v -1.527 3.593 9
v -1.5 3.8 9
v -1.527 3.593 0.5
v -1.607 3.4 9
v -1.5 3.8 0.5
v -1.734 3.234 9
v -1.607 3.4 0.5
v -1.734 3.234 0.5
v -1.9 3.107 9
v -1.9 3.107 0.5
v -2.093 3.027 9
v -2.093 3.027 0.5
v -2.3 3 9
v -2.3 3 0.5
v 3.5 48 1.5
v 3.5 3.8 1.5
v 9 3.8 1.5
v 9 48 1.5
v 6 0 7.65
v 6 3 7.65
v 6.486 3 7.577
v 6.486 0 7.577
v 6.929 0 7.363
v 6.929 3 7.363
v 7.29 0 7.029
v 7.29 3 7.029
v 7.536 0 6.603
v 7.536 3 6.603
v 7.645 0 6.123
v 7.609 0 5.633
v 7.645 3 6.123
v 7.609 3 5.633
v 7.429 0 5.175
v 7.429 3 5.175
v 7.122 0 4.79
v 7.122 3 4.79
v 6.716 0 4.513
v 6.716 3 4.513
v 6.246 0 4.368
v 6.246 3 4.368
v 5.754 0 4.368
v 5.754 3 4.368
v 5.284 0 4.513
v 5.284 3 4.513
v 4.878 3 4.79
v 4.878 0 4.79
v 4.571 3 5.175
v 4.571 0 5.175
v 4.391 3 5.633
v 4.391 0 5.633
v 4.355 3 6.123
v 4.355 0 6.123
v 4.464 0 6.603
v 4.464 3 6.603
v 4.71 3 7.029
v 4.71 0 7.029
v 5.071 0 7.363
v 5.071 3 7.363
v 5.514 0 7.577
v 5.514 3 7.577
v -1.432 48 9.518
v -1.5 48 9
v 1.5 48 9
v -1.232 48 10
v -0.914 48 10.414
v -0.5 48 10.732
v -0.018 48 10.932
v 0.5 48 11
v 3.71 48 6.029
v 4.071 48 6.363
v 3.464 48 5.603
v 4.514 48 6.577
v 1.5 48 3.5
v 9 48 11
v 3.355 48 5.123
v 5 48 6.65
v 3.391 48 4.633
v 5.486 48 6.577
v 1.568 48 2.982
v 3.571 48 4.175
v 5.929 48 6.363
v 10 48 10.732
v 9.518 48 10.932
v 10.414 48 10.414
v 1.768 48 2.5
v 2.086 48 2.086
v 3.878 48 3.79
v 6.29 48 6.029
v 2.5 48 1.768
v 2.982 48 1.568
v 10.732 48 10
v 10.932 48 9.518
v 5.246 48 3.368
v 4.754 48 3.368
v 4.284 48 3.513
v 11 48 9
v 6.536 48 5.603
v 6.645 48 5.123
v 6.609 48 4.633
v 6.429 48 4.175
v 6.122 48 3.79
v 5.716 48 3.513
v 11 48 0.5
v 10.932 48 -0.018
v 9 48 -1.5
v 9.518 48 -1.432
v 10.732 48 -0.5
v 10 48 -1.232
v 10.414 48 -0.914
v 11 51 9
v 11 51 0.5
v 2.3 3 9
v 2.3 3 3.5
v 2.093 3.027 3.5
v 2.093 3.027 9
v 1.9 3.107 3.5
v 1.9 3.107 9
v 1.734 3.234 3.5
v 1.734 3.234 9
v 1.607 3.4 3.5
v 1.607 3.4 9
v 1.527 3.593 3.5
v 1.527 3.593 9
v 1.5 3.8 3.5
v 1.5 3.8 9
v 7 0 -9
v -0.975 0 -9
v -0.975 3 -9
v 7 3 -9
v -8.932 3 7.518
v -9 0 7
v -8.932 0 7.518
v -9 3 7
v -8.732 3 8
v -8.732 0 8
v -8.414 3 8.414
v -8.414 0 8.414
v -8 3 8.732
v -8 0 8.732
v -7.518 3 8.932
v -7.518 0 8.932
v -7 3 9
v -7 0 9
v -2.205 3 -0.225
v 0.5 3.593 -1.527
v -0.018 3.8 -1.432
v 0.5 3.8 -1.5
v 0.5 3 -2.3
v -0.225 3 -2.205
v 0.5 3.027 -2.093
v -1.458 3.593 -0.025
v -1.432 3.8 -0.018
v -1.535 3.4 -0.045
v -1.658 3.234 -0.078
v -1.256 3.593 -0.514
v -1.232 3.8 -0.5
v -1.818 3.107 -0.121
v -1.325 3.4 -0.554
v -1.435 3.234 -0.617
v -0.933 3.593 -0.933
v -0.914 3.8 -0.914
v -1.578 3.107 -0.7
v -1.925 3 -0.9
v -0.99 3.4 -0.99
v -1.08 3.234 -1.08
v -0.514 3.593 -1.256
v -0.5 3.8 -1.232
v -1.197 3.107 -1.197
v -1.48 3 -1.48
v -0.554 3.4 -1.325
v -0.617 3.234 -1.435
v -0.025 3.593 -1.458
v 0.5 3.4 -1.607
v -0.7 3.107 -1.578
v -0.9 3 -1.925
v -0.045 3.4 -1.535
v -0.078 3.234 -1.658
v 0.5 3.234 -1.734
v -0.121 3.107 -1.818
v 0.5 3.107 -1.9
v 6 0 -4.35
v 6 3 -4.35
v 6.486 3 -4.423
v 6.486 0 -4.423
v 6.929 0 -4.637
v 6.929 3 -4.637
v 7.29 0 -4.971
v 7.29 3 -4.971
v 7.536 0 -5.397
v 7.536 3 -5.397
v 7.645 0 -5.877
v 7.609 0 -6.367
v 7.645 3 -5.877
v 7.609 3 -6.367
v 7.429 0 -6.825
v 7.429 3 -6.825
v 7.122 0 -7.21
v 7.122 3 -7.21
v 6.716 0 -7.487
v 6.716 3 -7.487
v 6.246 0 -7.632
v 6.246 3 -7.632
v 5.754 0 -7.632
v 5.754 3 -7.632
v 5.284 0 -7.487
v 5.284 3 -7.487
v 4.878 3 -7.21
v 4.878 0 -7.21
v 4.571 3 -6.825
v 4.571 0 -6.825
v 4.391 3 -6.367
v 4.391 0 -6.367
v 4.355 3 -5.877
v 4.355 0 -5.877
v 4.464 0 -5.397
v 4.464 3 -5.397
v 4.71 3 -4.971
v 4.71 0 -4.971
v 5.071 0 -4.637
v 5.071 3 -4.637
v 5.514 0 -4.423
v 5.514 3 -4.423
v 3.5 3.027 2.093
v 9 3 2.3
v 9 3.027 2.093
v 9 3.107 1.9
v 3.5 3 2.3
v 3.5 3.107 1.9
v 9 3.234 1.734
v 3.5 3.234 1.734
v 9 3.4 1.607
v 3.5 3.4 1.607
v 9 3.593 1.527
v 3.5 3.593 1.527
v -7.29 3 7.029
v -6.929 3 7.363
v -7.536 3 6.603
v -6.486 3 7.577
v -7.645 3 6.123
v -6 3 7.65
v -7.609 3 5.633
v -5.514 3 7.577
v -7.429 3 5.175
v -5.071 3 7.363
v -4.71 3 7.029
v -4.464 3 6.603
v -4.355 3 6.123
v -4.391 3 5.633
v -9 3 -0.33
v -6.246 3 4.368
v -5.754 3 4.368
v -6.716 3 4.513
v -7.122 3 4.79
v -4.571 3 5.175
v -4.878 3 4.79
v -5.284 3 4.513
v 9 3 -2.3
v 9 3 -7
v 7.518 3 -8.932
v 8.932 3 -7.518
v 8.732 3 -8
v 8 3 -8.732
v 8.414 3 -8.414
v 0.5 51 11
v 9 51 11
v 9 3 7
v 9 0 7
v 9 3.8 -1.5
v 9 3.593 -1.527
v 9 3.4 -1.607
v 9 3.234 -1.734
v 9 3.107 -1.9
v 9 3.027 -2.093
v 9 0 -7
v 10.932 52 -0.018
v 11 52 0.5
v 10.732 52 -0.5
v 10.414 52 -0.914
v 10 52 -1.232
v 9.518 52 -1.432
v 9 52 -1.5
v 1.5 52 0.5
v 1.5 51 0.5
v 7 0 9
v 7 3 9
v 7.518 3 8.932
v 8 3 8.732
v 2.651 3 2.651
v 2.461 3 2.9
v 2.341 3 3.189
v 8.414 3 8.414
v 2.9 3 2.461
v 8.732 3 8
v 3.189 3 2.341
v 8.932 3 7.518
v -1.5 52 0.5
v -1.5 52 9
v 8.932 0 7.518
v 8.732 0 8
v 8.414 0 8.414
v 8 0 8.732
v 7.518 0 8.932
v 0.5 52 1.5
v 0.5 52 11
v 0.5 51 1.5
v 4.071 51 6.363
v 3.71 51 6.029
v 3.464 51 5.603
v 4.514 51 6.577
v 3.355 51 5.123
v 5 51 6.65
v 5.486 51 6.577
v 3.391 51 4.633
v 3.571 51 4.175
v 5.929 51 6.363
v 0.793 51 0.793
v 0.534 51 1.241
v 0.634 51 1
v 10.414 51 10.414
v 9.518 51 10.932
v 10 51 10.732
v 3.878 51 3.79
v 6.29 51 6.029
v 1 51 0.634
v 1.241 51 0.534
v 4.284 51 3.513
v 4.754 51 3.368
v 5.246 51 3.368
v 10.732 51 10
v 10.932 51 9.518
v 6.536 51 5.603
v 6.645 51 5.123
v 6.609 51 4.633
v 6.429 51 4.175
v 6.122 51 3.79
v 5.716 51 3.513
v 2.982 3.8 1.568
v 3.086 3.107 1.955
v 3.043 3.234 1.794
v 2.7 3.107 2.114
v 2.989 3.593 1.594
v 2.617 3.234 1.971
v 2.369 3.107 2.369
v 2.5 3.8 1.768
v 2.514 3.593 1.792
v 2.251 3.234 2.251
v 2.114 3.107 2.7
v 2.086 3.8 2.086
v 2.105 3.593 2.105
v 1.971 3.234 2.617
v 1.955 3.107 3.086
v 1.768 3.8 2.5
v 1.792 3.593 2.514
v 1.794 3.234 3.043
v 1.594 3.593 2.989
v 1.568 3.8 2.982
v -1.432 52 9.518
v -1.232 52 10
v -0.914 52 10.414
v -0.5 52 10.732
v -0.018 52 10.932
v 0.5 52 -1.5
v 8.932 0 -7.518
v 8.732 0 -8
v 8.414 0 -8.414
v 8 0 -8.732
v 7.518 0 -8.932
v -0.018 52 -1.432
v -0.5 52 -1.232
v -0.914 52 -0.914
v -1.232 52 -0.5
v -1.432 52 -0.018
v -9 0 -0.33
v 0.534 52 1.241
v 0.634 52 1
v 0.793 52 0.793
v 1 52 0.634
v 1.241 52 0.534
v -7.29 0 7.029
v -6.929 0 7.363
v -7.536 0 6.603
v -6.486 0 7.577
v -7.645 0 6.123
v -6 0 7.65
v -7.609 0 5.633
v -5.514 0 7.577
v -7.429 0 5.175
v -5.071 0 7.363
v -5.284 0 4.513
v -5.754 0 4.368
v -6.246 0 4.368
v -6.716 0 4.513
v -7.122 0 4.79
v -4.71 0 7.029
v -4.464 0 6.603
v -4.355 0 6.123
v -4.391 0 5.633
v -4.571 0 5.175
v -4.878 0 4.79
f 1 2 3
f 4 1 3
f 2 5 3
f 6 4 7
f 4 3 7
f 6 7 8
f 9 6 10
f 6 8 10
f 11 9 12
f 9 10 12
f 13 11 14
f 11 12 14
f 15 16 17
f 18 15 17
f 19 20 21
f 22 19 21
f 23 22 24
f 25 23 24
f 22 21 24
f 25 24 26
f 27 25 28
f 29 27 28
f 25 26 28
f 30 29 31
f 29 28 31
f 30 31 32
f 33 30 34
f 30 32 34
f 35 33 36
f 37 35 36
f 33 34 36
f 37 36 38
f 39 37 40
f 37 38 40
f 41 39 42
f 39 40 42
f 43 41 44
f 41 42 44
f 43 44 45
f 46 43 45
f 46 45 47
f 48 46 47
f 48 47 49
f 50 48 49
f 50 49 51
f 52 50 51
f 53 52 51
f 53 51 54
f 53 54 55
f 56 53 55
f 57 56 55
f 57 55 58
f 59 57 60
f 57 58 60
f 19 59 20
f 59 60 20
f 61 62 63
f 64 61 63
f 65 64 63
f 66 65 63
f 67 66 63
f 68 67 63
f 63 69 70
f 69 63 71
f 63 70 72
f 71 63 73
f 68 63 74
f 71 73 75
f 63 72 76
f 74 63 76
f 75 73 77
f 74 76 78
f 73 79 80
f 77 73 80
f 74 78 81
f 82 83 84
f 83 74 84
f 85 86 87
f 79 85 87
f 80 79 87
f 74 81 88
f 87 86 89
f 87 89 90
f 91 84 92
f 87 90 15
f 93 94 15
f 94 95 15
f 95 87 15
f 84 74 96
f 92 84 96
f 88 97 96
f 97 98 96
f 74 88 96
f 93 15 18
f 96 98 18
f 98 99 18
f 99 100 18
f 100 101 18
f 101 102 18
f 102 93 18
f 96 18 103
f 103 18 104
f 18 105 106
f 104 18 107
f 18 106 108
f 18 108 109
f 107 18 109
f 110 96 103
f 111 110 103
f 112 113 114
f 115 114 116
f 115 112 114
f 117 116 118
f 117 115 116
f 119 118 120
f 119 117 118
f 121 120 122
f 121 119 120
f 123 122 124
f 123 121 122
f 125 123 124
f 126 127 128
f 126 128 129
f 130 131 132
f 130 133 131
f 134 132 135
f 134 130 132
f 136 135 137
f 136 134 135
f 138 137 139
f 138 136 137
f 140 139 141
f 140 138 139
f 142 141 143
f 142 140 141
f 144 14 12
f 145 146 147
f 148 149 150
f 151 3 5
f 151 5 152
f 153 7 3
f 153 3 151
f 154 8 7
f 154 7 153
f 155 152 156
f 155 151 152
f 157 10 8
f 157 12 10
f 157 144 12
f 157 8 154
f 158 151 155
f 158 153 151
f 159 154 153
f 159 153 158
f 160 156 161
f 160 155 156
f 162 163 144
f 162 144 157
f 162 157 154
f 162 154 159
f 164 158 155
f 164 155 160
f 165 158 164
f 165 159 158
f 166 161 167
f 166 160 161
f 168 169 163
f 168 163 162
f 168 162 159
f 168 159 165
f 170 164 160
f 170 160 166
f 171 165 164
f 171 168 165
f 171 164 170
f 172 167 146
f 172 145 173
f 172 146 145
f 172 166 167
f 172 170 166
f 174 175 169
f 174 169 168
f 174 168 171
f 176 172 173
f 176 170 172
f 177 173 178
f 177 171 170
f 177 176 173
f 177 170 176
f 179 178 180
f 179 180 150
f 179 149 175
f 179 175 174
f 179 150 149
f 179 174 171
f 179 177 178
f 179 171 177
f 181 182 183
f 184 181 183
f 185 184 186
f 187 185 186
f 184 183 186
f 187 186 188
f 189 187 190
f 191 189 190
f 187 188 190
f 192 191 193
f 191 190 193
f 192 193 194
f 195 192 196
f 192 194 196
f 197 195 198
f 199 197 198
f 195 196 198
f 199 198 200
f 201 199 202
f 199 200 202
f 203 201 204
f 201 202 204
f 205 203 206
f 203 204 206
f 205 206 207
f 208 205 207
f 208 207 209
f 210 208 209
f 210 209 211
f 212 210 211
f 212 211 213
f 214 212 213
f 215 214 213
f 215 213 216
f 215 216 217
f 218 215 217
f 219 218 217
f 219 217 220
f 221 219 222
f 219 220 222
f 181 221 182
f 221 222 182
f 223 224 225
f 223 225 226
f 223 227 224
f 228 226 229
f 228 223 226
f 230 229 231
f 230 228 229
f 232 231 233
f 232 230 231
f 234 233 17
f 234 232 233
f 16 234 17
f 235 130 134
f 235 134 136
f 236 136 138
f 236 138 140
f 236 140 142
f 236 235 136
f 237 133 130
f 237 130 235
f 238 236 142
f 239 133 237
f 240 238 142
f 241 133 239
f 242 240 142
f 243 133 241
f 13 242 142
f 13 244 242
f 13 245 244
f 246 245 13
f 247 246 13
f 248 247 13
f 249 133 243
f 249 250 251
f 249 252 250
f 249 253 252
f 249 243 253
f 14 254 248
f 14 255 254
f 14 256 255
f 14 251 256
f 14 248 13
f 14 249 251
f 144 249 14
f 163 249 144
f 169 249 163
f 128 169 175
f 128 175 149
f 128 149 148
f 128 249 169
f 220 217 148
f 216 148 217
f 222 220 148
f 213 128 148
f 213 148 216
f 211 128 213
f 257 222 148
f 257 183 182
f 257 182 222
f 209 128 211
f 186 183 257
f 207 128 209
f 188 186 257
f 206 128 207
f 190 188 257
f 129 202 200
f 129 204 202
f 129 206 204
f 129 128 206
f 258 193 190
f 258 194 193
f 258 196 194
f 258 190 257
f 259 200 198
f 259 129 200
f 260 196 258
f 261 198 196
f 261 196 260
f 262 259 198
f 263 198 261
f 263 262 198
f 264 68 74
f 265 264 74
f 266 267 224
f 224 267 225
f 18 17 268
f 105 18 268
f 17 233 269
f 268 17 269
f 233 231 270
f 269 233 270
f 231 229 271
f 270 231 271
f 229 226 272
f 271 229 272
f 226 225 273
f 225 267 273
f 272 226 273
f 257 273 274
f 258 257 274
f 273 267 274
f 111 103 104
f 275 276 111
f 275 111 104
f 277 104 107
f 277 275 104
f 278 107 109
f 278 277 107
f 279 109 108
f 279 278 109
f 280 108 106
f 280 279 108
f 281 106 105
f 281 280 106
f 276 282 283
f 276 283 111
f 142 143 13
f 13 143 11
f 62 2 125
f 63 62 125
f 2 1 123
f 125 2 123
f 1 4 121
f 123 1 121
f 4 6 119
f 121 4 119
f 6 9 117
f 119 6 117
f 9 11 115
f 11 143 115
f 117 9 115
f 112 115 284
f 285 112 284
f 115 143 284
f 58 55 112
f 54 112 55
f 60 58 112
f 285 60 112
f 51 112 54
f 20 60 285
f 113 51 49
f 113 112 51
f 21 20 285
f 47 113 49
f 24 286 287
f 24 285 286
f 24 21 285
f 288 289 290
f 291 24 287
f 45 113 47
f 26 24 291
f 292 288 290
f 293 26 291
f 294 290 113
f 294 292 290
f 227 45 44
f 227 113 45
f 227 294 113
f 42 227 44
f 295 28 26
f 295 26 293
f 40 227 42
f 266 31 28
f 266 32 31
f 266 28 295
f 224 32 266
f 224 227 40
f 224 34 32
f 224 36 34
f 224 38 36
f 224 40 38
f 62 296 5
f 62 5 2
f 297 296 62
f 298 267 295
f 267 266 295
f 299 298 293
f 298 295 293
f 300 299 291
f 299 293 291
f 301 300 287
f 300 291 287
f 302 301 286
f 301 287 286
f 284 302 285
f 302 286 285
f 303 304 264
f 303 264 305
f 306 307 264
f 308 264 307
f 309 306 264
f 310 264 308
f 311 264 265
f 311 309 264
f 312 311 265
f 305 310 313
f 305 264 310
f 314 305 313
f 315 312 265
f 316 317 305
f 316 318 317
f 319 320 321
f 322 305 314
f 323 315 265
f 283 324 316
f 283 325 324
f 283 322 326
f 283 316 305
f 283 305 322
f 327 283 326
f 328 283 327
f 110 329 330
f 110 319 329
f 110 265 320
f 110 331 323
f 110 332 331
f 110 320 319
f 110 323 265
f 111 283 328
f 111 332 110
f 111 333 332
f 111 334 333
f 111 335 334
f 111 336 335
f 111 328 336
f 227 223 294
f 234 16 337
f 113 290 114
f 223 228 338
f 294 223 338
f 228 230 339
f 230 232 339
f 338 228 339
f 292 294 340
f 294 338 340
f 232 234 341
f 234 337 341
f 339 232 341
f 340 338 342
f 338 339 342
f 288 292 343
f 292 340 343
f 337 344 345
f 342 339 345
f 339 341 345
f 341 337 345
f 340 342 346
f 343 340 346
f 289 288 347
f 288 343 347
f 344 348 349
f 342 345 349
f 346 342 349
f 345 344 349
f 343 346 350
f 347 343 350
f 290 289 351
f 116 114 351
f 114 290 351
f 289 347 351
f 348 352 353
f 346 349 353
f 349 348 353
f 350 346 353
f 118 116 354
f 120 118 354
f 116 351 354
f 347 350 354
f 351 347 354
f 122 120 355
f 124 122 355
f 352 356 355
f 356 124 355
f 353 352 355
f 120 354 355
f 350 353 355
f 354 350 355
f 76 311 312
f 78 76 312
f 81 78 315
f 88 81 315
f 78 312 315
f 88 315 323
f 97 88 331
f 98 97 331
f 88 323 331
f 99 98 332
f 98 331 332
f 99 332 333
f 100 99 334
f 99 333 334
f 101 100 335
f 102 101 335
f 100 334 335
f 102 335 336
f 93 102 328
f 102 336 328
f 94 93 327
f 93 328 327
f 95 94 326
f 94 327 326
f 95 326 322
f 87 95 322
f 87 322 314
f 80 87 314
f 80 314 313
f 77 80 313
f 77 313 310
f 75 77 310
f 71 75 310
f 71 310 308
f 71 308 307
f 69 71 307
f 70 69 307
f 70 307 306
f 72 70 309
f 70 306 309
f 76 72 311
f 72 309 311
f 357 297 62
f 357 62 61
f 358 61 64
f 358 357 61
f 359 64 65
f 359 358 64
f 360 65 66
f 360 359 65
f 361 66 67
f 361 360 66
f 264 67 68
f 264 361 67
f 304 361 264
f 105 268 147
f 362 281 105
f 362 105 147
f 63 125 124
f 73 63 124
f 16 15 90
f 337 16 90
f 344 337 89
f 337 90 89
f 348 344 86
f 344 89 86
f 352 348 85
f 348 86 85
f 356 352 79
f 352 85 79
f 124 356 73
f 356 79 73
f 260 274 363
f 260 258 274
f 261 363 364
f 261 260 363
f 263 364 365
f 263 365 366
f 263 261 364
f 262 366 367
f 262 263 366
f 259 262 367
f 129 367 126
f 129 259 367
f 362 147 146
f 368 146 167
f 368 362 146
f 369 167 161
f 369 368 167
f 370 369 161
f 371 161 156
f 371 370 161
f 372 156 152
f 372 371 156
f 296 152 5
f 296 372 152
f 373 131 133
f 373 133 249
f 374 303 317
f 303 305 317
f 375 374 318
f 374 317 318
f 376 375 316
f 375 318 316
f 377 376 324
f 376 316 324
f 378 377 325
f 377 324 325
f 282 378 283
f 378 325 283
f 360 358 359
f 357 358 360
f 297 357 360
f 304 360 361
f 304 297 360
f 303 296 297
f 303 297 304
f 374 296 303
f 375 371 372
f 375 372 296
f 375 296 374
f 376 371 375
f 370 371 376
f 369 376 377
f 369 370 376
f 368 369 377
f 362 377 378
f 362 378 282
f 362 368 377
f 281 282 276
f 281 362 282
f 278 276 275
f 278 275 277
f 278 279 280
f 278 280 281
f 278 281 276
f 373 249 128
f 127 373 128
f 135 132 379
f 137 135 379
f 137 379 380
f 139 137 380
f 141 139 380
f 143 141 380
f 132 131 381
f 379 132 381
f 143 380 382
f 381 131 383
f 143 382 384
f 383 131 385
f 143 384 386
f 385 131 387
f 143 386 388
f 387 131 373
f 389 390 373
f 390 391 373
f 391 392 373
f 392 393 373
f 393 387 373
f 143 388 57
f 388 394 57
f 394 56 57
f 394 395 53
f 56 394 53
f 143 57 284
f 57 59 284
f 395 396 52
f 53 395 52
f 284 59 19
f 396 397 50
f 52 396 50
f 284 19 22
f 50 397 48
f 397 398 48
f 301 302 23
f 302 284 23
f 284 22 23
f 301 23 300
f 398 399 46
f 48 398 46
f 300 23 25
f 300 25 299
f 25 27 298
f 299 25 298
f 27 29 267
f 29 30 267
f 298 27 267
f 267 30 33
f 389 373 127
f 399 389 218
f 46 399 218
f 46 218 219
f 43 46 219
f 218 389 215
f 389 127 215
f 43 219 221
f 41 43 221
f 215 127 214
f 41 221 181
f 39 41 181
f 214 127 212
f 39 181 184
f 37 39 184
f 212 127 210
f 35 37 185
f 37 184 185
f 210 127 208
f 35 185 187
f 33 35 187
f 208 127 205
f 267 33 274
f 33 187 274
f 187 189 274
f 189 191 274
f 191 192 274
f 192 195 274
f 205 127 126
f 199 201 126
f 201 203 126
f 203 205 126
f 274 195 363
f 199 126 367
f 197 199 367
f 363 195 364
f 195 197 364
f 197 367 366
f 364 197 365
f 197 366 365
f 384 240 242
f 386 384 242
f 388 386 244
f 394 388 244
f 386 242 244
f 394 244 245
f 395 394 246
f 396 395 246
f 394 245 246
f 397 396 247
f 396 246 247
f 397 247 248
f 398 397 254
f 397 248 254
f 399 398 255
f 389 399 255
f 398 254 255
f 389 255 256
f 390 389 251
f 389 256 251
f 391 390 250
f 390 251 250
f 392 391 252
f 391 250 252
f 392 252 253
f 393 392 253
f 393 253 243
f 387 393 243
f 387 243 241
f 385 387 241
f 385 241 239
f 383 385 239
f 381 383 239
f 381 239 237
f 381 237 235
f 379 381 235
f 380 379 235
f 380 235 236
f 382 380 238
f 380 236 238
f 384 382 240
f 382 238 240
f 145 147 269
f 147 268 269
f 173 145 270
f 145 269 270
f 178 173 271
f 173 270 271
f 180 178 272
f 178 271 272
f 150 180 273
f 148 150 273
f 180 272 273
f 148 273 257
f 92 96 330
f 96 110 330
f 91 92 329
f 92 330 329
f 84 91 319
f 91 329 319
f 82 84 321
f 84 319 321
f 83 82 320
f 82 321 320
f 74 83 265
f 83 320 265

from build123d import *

# Parameters (mm, degrees)
SKETCH_1_W          = 18
SKETCH_1_H          = 18
EXTRUDE_1_DEPTH     = 3
SKETCH_2_R          = 1.65
CUT_EXTRUDE_1_DEPTH = 3
SKETCH_3_W          = 3
SKETCH_3_H          = 3
SKETCH_3_W_2        = 7.5
SKETCH_3_H_2        = 7.5
EXTRUDE_2_DEPTH     = 45
SKETCH_4_W          = 12.5
SKETCH_4_H          = 12.5
EXTRUDE_3_DEPTH     = 3
SKETCH_5_R          = 1.65
CUT_EXTRUDE_2_DEPTH = 3
CUT_EXTRUDE_3_DEPTH = 3
FILLET_1_R          = 2
FILLET_2_R          = 0.8
EXTRUDE_START       = 1
EXTRUDE_4_DEPTH     = 1
FILLET_3_R          = 1


with BuildPart() as part:
    # 草图1 → 凸台-拉伸1 (new body)
    with BuildSketch(Plane(origin=(0, 0, 0), x_dir=(1, 0, 0), z_dir=(0, 1, 0))):
        Rectangle(SKETCH_1_W, SKETCH_1_H)
    extrude(amount=EXTRUDE_1_DEPTH)

    # 草图2 → 切除-拉伸1 (cut)
    with BuildSketch(Plane(origin=(0, 3, 0), x_dir=(1, 0, 0), z_dir=(0, 1, 0))):
        with Locations(Location((-6, 6, 0), (0, 0, 270))):
            Circle(SKETCH_2_R)
        with Locations(Location((6, 6, 0), (0, 0, 270))):
            Circle(SKETCH_2_R)
        with Locations(Location((6, -6, 0), (0, 0, 270))):
            Circle(SKETCH_2_R)
        with Locations(Location((-6, -6, 0), (0, 0, 270))):
            Circle(SKETCH_2_R)
    extrude(amount=-CUT_EXTRUDE_1_DEPTH, mode=Mode.SUBTRACT)

    # 草图3 → 凸台-拉伸2 (add)
    with BuildSketch(Plane(origin=(0, 3, 0), x_dir=(1, 0, 0), z_dir=(0, 1, 0))):
        Rectangle(SKETCH_3_W, SKETCH_3_H)
        with Locations((5.25, 0)):
            Rectangle(SKETCH_3_W_2, SKETCH_3_H)
        with Locations((0, -5.25)):
            Rectangle(SKETCH_3_W, SKETCH_3_H_2)
    extrude(amount=EXTRUDE_2_DEPTH)

    # 草图4 → 凸台-拉伸3 (add)
    with BuildSketch(Plane(origin=(0, 48, 0), x_dir=(1, 0, 0), z_dir=(0, 1, 0))):
        with Locations((4.75, -4.75)):
            Rectangle(SKETCH_4_W, SKETCH_4_H)
    extrude(amount=EXTRUDE_3_DEPTH)

    # 草图5 → 切除-拉伸2 (cut)
    with BuildSketch(Plane(origin=(0, 51, 0), x_dir=(1, 0, 0), z_dir=(0, 1, 0))):
        with Locations(Location((5, -5, 0), (0, 0, 270))):
            Circle(SKETCH_5_R)
    extrude(amount=-CUT_EXTRUDE_2_DEPTH, mode=Mode.SUBTRACT)

    # 草图6 → 切除-拉伸3 (cut)
    with BuildSketch(Plane(origin=(0, 3, 0), x_dir=(1, 0, 0), z_dir=(0, 1, 0))):
        Polygon((-9, 9), (-9, 0.329900852), (-0.974802815, 9), align=None)
    extrude(amount=-CUT_EXTRUDE_3_DEPTH, mode=Mode.SUBTRACT)

    # 圆角1
    fillet_1_edges = [part.edges().sort_by_distance(p)[0] for p in [
        (-9, 1.5, 9),
        (9, 1.5, 9),
        (9, 1.5, -9),
        (-1.5, 49.5, 11),
        (11, 49.5, 11),
        (11, 49.5, -1.5),
        (1.5, 25.5, 1.5),
        (-1.5, 27, -1.5),
    ]]
    fillet(fillet_1_edges, radius=FILLET_1_R)

    # 圆角2
    fillet_2_edges = [part.edges().sort_by_distance(p)[0] for p in [
        (2.085786438, 3, 2.085786438),
        (-0.914213562, 3, -0.914213562),
        (1.5, 3, 6.25),
        (-1.5, 3, 4.75),
        (6.25, 3, 1.5),
        (4.75, 3, -1.5),
    ]]
    fillet(fillet_2_edges, radius=FILLET_2_R)

    # 草图7 → 凸台-拉伸4 (add)
    with BuildSketch(Plane(origin=(0, 51, 0), x_dir=(1, 0, 0), z_dir=(0, 1, 0)).offset(EXTRUDE_START)):
        with BuildLine():
            Line((0.5, -11), (0.5, -0.5))
            Line((0.5, -0.5), (11, -0.5))
            ThreePointArc((11, -0.5), (10.414213562, 0.914213562), (9, 1.5))
            Line((9, 1.5), (0.5, 1.5))
            ThreePointArc((0.5, 1.5), (-0.914213562, 0.914213562), (-1.5, -0.5))
            Line((-1.5, -0.5), (-1.5, -9))
            ThreePointArc((-1.5, -9), (-0.914213562, -10.414213562), (0.5, -11))
        make_face()
    extrude(amount=-EXTRUDE_4_DEPTH)

    # 圆角3
    fillet_3_edges = [part.edges().sort_by_distance(p)[0] for p in [
        (0.5, 51.5, 0.5),
    ]]
    fillet(fillet_3_edges, radius=FILLET_3_R)


solid = part.part
